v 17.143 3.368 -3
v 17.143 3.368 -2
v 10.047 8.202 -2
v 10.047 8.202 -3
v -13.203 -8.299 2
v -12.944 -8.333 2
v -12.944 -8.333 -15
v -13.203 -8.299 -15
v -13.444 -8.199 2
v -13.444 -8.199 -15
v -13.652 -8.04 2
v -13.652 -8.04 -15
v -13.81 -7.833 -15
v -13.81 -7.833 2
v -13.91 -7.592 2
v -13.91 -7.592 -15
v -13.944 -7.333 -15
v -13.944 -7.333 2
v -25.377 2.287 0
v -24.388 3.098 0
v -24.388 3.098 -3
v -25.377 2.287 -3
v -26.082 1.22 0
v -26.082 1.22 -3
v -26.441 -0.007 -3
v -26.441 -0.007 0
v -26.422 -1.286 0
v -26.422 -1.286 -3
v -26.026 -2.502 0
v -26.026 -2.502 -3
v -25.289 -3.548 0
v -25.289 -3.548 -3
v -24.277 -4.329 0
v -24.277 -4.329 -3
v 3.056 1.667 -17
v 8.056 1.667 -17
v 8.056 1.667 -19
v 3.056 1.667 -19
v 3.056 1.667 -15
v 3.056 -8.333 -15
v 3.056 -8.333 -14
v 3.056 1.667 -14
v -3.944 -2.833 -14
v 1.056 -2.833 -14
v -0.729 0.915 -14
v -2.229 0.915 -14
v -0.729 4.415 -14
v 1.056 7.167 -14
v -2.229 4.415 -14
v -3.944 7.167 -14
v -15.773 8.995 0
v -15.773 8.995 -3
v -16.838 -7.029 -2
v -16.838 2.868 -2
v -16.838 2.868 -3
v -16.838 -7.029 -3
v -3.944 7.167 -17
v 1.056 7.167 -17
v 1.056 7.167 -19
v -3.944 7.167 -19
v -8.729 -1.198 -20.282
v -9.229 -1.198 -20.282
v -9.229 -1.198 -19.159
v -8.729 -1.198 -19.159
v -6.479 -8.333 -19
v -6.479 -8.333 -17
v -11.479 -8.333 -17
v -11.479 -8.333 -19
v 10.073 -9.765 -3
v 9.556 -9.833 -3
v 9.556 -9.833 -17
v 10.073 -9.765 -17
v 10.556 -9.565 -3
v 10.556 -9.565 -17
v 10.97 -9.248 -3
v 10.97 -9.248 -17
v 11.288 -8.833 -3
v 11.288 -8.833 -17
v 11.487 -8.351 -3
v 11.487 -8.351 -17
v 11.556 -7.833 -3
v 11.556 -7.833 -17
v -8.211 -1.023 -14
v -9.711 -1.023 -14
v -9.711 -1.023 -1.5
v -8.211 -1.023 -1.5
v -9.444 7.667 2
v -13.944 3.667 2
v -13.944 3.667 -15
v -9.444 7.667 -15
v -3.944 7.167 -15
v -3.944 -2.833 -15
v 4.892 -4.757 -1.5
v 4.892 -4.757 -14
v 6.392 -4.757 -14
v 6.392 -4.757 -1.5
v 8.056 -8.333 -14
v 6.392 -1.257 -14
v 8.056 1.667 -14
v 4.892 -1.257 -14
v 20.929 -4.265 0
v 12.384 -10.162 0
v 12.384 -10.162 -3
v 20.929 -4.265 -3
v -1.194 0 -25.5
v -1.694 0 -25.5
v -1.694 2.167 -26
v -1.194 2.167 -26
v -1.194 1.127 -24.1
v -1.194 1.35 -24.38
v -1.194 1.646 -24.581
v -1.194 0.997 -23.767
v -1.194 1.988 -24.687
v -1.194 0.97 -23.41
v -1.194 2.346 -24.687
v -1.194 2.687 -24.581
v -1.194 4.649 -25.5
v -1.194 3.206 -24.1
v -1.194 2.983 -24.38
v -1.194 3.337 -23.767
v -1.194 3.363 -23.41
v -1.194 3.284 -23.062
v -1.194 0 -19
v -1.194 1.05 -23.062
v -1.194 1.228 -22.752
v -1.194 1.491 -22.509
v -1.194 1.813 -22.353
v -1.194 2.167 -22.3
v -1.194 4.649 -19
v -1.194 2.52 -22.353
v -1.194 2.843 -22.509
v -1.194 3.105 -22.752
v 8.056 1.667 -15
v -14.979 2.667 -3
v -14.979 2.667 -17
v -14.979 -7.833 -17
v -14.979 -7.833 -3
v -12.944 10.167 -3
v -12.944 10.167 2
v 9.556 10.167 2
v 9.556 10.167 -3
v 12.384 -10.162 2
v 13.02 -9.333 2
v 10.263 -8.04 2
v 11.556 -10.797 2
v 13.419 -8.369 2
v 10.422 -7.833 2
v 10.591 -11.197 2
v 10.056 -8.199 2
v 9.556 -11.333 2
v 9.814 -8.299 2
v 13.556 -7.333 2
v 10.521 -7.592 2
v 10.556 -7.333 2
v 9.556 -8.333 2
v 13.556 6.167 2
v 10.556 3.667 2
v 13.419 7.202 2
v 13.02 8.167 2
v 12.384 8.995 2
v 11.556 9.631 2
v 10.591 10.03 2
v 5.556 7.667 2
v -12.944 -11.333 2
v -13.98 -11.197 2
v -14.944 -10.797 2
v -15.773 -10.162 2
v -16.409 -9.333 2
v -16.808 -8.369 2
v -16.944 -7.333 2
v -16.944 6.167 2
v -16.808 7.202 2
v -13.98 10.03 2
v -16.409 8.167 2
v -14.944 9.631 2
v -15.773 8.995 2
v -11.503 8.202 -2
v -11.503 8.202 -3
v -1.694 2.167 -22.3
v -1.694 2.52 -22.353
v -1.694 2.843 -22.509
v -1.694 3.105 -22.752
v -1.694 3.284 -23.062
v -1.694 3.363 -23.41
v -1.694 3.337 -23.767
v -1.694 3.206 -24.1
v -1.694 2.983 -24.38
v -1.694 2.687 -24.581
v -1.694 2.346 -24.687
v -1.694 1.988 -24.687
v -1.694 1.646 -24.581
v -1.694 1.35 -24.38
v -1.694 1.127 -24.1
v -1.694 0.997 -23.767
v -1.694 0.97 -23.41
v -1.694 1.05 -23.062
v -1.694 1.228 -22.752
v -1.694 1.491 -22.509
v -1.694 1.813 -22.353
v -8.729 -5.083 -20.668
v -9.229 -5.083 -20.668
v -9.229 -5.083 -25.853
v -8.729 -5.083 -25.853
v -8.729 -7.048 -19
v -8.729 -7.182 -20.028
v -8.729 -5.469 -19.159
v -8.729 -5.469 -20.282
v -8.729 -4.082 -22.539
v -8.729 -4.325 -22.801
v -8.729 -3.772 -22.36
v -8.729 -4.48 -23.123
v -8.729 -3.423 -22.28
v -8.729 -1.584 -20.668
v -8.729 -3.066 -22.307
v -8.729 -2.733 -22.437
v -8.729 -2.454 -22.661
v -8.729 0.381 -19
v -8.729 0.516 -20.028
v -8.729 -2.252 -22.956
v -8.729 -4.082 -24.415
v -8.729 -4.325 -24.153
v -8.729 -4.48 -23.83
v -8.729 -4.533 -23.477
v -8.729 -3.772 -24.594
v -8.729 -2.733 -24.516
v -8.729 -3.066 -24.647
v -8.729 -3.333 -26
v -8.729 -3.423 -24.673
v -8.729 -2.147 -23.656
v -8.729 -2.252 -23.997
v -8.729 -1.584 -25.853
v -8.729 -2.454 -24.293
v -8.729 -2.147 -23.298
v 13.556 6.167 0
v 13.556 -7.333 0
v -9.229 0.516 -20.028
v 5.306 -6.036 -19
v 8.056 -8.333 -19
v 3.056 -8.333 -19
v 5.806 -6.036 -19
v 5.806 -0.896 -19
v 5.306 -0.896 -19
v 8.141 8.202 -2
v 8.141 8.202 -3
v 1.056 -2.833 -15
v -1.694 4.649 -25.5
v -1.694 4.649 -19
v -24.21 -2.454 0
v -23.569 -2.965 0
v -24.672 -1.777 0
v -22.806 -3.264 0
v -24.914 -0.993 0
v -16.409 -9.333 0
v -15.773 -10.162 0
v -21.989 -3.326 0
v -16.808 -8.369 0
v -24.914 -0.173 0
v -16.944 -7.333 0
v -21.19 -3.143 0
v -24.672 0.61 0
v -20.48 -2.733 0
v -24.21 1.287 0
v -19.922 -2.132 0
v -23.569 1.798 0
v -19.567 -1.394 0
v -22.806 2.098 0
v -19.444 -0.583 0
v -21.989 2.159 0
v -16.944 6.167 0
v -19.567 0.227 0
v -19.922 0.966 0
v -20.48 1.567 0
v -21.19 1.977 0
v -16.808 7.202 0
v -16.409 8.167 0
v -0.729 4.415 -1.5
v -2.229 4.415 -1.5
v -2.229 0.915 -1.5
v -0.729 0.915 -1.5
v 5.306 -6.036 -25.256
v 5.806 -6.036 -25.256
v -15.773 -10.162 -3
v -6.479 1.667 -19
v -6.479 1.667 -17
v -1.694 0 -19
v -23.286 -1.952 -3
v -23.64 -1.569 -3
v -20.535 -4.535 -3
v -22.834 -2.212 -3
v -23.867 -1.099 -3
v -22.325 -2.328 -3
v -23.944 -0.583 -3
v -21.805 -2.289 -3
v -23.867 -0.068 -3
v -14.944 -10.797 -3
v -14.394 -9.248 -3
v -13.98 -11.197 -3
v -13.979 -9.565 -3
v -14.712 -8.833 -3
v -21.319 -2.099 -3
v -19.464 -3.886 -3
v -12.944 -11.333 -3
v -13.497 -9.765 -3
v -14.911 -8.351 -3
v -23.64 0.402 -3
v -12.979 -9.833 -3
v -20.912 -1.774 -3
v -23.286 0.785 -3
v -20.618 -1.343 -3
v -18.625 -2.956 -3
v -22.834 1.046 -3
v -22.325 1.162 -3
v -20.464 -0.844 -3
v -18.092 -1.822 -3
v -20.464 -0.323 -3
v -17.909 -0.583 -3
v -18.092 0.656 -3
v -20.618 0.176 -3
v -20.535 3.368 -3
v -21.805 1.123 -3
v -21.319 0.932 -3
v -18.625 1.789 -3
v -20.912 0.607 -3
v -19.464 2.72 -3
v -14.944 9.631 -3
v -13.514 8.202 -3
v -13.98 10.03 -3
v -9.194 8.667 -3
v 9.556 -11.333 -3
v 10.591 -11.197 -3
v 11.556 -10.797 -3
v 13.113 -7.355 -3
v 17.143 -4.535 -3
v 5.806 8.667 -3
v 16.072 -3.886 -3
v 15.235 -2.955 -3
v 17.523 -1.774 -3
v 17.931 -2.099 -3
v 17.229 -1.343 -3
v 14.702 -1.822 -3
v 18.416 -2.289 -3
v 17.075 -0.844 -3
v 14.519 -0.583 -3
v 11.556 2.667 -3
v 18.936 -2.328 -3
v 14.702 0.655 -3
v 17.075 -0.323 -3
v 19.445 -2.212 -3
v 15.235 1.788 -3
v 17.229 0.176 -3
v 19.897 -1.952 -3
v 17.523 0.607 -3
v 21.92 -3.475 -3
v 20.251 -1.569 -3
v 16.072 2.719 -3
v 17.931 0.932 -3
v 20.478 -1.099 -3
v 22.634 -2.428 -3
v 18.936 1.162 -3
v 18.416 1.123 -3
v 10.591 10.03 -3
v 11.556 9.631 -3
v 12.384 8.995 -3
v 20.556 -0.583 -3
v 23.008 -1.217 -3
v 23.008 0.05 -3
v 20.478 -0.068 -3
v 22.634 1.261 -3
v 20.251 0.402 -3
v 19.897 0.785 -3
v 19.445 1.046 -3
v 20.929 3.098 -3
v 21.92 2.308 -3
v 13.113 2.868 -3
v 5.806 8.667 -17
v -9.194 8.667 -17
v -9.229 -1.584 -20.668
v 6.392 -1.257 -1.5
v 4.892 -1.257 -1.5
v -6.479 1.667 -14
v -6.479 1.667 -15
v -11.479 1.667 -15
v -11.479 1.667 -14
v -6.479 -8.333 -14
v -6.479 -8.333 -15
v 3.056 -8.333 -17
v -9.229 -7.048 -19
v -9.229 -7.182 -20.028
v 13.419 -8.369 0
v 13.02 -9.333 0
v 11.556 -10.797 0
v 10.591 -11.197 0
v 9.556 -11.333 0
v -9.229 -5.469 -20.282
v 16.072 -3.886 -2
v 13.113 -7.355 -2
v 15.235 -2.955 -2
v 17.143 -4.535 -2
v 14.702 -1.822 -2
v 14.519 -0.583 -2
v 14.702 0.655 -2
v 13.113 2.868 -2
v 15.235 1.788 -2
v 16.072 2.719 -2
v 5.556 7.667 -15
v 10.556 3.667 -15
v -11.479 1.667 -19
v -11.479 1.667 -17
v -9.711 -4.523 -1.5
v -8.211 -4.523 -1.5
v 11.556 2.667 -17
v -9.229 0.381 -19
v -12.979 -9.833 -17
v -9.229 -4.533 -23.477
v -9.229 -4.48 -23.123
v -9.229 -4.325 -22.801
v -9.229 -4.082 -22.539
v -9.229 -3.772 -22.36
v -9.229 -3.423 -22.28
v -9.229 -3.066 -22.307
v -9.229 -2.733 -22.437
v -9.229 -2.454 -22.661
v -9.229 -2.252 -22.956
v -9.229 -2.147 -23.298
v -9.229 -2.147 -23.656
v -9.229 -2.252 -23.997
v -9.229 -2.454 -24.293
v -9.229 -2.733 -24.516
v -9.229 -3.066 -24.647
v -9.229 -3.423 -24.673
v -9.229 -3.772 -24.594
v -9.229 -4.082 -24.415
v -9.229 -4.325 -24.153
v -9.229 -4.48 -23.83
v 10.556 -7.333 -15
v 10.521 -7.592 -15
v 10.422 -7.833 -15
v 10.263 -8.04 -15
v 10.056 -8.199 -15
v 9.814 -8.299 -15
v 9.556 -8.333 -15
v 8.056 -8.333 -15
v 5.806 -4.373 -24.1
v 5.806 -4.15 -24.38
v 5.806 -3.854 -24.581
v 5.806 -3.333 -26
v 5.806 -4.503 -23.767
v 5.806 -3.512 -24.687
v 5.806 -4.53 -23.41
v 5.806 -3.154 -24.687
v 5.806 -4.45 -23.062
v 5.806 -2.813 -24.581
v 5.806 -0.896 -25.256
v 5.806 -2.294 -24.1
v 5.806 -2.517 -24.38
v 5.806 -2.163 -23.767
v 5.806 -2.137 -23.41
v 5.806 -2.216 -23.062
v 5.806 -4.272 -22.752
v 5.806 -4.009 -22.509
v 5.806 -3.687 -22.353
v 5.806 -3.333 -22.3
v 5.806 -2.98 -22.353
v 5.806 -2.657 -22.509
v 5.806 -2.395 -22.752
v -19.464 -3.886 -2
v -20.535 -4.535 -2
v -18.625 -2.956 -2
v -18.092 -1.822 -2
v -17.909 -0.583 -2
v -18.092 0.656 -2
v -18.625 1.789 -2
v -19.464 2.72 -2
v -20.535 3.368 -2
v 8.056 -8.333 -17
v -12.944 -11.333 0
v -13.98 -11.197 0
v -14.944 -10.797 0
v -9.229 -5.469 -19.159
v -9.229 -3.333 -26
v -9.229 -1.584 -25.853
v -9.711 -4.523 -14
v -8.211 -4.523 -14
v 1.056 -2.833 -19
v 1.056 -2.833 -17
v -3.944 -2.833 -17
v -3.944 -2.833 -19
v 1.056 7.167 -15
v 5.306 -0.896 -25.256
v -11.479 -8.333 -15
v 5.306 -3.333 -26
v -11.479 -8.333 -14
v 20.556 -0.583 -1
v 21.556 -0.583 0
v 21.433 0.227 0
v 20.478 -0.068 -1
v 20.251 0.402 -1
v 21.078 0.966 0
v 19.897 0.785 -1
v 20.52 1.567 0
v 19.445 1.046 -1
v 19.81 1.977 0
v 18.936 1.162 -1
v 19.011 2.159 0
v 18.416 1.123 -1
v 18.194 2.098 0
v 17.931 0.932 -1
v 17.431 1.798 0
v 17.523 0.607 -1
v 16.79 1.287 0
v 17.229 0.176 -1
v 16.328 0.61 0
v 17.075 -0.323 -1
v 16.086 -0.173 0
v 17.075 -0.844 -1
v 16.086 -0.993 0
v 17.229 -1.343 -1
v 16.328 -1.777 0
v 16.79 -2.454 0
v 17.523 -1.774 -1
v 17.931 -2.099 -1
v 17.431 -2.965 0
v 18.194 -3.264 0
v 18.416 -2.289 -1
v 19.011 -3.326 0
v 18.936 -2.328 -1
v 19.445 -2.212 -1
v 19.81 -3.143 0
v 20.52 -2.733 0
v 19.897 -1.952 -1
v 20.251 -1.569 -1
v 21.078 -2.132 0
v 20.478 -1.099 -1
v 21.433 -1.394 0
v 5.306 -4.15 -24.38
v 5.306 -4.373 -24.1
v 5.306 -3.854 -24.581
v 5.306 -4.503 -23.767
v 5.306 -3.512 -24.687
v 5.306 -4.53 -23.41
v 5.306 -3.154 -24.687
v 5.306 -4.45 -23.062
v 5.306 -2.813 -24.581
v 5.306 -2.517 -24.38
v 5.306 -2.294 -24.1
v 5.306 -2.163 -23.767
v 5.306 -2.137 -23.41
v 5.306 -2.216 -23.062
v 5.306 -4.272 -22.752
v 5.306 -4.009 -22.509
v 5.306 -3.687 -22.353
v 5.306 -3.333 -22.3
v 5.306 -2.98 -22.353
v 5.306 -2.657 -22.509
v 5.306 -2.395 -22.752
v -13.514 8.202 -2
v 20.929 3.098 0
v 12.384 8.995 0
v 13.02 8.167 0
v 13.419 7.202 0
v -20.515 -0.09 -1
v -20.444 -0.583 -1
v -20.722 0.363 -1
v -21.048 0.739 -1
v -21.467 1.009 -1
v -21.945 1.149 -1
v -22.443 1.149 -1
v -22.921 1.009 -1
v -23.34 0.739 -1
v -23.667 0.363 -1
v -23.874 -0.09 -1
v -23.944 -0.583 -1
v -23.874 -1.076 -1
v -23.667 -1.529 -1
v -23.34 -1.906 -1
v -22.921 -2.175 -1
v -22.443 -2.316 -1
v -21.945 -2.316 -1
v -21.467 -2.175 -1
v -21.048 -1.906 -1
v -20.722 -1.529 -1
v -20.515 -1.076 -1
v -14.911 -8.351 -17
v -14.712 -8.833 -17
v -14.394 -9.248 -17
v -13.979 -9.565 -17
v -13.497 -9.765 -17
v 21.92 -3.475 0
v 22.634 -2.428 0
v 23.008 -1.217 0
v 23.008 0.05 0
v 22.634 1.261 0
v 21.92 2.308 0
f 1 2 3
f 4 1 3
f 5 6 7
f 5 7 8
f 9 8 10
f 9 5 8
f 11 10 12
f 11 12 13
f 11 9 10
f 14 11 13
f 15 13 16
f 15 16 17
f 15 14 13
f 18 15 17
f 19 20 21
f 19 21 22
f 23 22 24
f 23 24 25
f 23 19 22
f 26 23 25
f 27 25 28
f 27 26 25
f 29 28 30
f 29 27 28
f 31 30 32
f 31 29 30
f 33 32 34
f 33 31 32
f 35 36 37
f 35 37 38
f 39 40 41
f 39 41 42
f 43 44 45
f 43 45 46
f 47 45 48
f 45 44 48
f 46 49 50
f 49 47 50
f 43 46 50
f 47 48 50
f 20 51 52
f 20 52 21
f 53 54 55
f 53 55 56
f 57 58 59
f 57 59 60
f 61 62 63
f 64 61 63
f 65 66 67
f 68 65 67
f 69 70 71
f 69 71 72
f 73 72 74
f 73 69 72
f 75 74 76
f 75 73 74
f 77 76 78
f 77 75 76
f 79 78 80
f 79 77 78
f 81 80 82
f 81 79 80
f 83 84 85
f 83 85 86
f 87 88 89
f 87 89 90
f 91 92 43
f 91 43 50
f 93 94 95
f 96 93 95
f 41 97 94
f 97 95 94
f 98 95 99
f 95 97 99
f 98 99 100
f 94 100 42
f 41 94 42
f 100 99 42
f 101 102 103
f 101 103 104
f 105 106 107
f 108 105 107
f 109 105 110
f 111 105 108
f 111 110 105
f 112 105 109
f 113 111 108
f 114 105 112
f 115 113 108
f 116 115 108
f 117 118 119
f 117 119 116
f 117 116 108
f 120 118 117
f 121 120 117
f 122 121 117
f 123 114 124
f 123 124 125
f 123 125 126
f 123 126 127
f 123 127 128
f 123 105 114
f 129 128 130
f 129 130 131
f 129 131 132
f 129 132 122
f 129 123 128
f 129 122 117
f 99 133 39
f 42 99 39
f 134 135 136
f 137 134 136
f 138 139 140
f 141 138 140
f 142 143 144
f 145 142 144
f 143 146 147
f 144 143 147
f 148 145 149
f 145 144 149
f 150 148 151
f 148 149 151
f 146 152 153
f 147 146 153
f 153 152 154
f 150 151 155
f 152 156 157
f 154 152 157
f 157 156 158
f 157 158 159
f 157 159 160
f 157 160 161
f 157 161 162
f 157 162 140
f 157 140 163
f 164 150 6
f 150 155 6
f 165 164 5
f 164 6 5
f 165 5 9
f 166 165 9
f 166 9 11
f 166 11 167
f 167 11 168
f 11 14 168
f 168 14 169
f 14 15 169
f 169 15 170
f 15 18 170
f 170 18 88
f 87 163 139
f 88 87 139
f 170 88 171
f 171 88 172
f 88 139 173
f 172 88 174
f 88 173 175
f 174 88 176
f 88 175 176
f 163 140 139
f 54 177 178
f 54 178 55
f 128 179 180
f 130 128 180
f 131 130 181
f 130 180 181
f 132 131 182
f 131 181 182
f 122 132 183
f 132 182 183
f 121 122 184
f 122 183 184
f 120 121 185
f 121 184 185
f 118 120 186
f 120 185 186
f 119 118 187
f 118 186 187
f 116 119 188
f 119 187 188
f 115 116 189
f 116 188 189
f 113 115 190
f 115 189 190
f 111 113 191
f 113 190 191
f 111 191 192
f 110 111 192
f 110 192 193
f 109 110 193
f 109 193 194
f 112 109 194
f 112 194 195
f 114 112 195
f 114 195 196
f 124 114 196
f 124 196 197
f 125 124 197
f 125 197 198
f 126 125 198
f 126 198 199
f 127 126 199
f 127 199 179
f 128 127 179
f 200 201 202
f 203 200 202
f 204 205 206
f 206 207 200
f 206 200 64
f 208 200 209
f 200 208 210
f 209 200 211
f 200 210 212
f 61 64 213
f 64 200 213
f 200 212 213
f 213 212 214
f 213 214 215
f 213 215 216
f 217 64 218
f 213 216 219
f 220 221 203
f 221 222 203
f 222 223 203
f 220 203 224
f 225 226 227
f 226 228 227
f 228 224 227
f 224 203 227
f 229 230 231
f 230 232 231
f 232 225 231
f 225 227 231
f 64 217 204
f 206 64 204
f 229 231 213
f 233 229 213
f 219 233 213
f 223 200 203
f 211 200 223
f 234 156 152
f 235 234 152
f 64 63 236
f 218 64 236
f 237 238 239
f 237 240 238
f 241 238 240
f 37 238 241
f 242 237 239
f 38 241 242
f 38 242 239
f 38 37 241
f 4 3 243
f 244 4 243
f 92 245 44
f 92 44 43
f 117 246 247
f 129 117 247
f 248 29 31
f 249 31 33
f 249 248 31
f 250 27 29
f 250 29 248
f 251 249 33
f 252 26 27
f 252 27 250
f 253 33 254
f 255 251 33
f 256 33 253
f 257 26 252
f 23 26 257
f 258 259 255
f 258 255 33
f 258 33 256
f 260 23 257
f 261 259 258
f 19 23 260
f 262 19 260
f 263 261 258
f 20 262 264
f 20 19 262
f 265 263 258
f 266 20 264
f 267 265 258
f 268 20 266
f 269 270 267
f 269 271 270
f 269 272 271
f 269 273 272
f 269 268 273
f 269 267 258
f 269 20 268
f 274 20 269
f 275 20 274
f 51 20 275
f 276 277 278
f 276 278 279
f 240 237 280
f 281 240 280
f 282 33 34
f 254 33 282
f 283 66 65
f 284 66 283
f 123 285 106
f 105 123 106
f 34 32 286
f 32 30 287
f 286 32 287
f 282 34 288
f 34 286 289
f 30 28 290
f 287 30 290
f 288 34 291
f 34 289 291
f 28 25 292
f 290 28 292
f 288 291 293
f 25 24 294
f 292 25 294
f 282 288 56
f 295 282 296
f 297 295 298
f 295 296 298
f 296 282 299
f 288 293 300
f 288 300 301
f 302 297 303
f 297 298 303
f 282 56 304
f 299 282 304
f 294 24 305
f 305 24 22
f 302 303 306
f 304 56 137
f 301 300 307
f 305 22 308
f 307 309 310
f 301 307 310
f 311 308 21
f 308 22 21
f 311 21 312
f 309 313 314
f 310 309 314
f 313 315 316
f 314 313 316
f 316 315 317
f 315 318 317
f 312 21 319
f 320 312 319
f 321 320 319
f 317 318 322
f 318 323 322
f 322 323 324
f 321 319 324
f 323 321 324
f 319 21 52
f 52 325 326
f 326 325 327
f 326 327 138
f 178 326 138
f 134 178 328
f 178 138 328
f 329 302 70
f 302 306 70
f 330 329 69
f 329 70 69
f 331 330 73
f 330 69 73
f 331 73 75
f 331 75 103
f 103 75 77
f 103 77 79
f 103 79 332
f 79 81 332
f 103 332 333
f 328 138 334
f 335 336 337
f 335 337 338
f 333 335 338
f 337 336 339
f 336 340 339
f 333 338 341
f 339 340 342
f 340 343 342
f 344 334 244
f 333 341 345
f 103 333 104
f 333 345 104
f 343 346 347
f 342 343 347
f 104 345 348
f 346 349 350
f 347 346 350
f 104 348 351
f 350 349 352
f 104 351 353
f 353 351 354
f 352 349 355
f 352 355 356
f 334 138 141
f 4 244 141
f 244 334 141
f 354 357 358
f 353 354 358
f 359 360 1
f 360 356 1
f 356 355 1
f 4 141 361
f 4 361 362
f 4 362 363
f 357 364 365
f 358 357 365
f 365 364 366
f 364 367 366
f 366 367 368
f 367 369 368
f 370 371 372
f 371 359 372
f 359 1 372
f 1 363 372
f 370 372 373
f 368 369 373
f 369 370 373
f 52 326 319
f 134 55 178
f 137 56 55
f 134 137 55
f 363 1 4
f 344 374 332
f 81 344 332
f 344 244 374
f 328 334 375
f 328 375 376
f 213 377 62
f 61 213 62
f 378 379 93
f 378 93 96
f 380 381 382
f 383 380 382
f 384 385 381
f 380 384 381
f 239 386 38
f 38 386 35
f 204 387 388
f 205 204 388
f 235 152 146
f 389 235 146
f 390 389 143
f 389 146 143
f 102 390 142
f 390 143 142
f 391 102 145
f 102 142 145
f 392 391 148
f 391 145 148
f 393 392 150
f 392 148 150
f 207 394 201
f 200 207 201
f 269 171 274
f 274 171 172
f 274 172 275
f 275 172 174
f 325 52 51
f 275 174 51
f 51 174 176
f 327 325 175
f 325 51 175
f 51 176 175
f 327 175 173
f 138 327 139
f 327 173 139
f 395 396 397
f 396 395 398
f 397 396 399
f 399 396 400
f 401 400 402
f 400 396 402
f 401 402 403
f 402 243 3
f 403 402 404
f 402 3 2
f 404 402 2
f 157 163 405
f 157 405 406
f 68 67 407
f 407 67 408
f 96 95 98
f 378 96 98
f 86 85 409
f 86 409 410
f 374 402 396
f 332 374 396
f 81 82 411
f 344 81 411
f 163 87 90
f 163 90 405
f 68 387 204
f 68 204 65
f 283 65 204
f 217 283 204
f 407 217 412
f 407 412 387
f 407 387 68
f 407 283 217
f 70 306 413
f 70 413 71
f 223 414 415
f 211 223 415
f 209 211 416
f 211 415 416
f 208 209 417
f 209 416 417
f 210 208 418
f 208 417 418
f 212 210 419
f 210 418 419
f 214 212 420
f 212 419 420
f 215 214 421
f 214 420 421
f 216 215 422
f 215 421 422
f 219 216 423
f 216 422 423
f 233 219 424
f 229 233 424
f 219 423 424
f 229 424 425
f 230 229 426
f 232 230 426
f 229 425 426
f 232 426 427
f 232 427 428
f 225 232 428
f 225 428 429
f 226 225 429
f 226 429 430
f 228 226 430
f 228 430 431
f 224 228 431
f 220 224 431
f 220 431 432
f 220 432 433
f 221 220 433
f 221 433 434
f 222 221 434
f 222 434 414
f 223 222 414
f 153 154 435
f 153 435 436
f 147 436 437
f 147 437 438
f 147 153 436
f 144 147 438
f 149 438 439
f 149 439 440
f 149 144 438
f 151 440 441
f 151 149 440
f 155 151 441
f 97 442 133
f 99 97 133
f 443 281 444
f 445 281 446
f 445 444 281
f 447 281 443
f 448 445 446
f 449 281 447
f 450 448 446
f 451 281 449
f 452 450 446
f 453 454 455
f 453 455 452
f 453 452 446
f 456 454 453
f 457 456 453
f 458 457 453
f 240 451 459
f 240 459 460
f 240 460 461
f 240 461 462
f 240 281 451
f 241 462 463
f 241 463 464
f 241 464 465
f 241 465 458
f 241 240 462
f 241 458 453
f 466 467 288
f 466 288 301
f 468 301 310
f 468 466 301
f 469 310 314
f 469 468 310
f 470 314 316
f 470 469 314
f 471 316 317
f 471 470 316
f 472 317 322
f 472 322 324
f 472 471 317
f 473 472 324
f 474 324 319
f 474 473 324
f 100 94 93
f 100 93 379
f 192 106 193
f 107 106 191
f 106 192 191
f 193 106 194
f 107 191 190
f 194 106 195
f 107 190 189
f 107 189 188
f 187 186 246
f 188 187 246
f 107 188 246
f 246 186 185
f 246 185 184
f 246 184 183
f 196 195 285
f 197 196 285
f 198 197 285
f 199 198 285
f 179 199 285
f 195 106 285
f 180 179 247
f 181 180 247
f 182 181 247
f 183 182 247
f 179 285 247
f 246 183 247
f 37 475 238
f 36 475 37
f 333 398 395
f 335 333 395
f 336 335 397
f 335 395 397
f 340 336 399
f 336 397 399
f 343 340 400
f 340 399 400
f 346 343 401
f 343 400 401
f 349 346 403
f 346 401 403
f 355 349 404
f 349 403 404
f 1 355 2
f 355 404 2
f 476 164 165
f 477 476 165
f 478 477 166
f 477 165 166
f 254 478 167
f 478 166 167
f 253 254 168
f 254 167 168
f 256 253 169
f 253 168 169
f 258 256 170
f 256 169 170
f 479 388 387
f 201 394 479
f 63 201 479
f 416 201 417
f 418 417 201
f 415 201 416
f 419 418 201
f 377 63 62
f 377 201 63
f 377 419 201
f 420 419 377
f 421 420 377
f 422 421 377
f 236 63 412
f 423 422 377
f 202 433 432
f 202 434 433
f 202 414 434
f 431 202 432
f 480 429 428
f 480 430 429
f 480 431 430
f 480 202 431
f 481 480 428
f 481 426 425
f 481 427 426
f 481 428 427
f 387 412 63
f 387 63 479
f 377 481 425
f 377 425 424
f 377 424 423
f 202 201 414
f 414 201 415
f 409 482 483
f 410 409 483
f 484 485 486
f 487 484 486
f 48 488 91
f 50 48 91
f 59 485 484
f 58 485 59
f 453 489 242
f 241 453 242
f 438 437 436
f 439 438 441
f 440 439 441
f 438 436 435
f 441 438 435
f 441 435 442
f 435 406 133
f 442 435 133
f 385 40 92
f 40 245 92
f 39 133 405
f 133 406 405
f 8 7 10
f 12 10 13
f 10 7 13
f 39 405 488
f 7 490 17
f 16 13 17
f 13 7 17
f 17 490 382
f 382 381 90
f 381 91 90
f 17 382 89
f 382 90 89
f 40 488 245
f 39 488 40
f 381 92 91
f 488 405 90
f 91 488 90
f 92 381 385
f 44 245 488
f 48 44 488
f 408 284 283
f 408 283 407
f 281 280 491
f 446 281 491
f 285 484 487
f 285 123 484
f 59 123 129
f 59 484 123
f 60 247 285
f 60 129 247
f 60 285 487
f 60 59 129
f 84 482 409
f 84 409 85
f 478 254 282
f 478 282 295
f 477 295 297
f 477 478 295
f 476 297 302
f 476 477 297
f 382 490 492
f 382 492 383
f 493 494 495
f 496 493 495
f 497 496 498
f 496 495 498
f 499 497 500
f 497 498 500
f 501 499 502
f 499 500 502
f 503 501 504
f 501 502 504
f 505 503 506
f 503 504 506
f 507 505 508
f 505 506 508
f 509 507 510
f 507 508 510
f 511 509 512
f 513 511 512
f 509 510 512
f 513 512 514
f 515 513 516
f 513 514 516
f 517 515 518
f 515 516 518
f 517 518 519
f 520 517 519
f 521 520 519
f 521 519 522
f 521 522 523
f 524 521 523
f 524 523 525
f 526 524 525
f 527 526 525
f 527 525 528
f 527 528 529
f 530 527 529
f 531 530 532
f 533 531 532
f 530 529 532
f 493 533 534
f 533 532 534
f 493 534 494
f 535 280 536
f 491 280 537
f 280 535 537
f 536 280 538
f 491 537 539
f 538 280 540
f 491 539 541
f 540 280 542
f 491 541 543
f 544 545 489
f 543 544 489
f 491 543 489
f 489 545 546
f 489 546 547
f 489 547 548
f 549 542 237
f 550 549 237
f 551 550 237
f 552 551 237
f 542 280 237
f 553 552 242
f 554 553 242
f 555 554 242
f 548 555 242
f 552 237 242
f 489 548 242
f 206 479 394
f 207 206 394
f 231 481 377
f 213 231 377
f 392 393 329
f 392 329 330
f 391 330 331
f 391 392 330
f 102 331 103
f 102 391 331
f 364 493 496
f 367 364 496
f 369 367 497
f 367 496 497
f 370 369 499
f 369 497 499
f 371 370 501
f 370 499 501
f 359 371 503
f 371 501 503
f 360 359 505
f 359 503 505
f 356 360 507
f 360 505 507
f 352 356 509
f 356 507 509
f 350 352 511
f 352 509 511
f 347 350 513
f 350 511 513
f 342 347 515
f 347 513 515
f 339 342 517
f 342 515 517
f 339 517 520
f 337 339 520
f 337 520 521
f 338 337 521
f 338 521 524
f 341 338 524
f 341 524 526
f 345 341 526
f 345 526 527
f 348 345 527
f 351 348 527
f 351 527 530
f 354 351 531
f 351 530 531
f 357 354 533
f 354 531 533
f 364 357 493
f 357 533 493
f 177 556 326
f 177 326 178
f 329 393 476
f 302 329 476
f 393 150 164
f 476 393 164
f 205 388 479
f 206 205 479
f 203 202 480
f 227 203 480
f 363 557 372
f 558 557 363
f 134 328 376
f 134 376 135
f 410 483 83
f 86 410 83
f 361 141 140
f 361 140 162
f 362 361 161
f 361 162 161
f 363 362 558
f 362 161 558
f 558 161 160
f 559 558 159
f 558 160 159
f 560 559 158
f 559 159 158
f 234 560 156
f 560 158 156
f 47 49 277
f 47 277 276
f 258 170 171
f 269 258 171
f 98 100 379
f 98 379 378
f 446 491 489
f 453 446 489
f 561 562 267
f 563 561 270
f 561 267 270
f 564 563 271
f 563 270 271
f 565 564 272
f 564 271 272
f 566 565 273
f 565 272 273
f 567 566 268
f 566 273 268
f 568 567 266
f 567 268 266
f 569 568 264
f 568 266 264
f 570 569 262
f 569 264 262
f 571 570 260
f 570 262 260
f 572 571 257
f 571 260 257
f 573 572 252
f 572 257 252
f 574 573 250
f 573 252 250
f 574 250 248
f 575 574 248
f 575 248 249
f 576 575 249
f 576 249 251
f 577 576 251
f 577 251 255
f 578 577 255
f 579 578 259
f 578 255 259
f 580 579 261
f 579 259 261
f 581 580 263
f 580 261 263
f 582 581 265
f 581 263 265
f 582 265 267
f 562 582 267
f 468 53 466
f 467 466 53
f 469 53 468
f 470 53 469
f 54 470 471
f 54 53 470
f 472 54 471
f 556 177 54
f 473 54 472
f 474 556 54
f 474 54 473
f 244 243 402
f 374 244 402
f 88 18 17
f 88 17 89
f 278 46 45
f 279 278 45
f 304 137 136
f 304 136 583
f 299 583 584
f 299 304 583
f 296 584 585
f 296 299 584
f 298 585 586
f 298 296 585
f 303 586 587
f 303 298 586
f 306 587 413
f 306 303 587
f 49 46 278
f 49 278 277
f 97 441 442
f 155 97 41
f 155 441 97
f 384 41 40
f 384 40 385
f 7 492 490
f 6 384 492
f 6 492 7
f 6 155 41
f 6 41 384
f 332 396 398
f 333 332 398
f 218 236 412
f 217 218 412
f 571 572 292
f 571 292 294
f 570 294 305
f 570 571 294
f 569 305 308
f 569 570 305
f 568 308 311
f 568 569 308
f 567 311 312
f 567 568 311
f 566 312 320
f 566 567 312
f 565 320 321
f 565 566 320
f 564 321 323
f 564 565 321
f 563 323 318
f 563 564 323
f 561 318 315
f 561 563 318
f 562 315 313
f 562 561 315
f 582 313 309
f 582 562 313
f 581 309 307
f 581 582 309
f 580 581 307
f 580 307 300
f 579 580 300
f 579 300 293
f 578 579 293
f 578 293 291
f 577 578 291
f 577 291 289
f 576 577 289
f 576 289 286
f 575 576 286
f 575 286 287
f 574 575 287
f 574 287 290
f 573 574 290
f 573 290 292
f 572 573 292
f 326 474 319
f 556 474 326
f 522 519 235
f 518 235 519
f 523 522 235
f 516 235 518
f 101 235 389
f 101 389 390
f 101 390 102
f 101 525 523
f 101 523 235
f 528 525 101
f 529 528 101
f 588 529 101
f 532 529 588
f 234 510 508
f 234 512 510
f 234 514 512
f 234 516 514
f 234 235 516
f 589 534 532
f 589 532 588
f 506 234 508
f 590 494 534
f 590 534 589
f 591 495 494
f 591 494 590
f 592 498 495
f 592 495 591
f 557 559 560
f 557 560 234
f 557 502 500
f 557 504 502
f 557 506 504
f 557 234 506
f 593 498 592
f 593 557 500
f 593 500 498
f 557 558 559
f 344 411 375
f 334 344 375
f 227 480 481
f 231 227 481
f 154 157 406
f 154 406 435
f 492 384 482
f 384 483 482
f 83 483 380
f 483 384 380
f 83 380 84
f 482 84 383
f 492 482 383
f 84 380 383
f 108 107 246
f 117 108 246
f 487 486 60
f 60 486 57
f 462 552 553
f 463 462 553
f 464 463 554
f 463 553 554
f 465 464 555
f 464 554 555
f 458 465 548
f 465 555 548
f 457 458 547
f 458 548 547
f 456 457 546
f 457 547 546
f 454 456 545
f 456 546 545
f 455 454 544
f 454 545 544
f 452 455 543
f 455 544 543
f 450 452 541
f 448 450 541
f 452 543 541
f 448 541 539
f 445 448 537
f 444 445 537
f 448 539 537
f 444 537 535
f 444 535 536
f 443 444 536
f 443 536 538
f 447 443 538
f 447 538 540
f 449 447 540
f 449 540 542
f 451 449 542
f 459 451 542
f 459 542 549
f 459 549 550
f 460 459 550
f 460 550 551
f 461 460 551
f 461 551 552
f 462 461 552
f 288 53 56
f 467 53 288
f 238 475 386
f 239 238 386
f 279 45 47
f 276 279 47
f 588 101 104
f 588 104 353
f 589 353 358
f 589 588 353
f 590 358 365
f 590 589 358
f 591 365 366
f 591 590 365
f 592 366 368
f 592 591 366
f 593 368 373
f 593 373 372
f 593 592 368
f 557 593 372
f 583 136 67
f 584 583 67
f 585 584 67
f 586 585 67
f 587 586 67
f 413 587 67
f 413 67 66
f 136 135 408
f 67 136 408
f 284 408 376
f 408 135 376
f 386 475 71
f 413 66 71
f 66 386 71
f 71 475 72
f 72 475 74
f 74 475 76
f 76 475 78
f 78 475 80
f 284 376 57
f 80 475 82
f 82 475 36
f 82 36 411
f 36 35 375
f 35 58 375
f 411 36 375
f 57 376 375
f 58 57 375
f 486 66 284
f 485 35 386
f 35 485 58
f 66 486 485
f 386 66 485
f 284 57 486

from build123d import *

# Parameters (mm, degrees)
SKETCH_1_R          = 1.75
EXTRUDE_1_DEPTH     = 3
EXTRUDE_START       = 2
EXTRUDE_2_DEPTH     = 2
EXTRUDE_3_DEPTH     = 14
CUT_EXTRUDE_START   = -1
CUT_EXTRUDE_1_DEPTH = 1
CHAMFER_1_SIZE      = 1
CHAMFER_2_SIZE      = 1
SKETCH_6_W          = 5
SKETCH_6_H          = 10
EXTRUDE_4_DEPTH     = 2
SKETCH_7_W          = 0.5
SKETCH_7_H          = 8
EXTRUDE_5_DEPTH     = 7
SKETCH_8_R          = 1.2
CUT_EXTRUDE_2_DEPTH = 3
SKETCH_11_R         = 1.2
CUT_EXTRUDE_3_DEPTH = 3
SKETCH_12_R         = 1.2
CUT_EXTRUDE_4_DEPTH = 3
CUT_EXTRUDE_6_DEPTH = 17
SKETCH_16_W         = 5
SKETCH_16_H         = 10
EXTRUDE_7_DEPTH     = 5
SKETCH_17_W         = 1.5
SKETCH_17_H         = 3.5
EXTRUDE_8_DEPTH     = 12.5


with BuildPart() as part:
    # Эскиз1 → Бобышка-Вытянуть1 (new body)
    with BuildSketch(Plane.XY):
        with BuildLine():
            ThreePointArc((20.928890361, -4.264902198), (23.055555556, -0.583333333), (20.928890361, 3.098235531))
            Line((20.928890361, 3.098235531), (12.38398268, 8.995093791))
            ThreePointArc((12.38398268, 8.995093791), (11.086289285, 9.862184797), (9.555555556, 10.166666667))
            Line((9.555555556, 10.166666667), (-12.944444444, 10.166666667))
            ThreePointArc((-12.944444444, 10.166666667), (-14.475178174, 9.862184797), (-15.772871569, 8.995093791))
            Line((-15.772871569, 8.995093791), (-24.387947706, 3.098235531))
            ThreePointArc((-24.387947706, 3.098235531), (-26.479451538, -0.647521096), (-24.276691296, -4.328951295))
            Line((-24.276691296, -4.328951295), (-15.772871569, -10.161760458))
            ThreePointArc((-15.772871569, -10.161760458), (-14.475178174, -11.028851463), (-12.944444444, -11.333333333))
            Line((-12.944444444, -11.333333333), (9.555555556, -11.333333333))
            ThreePointArc((9.555555556, -11.333333333), (11.086289285, -11.028851463), (12.38398268, -10.161760458))
            Line((12.38398268, -10.161760458), (20.928890361, -4.264902198))
        make_face()
        with Locations((18.805555556, -0.583333333)):
            Circle(SKETCH_1_R, mode=Mode.SUBTRACT)
        with BuildLine():
            ThreePointArc((-23.944444444, -0.583333333), (-22.194444444, 1.166666667), (-20.444444444, -0.583333333))
            ThreePointArc((-20.444444444, -0.583333333), (-22.194444444, -2.333333333), (-23.944444444, -0.583333333))
        make_face(mode=Mode.SUBTRACT)
    extrude(amount=-EXTRUDE_1_DEPTH)

    # Эскиз3 → Бобышка-Вытянуть2 (add)
    with BuildSketch(Plane.XY.offset(EXTRUDE_START)):
        with BuildLine():
            Line((-12.944444444, 10.166666667), (9.555555556, 10.166666667))
            ThreePointArc((9.555555556, 10.166666667), (12.38398268, 8.995093791), (13.555555556, 6.166666667))
            Line((13.555555556, 6.166666667), (13.555555556, -7.333333333))
            ThreePointArc((13.555555556, -7.333333333), (12.38398268, -10.161760458), (9.555555556, -11.333333333))
            Line((9.555555556, -11.333333333), (-12.944444444, -11.333333333))
            ThreePointArc((-12.944444444, -11.333333333), (-15.772871569, -10.161760458), (-16.944444444, -7.333333333))
            Line((-16.944444444, -7.333333333), (-16.944444444, 6.166666667))
            ThreePointArc((-16.944444444, 6.166666667), (-15.772871569, 8.995093791), (-12.944444444, 10.166666667))
        make_face()
    extrude(amount=-EXTRUDE_2_DEPTH)

    # Эскиз4 → Бобышка-Вытянуть3 (add)
    with BuildSketch(Plane(origin=(0, 0, -3), x_dir=(-1, 0, 0), z_dir=(0, 0, -1))):
        with BuildLine():
            Line((-5.805555556, 8.666666667), (9.194444444, 8.666666667))
            Line((9.194444444, 8.666666667), (14.979451538, 2.666666667))
            Line((14.979451538, 2.666666667), (14.979451538, -7.833333333))
            ThreePointArc((14.979451538, -7.833333333), (14.393665101, -9.247546896), (12.979451538, -9.833333333))
            Line((12.979451538, -9.833333333), (-9.555555556, -9.833333333))
            ThreePointArc((-9.555555556, -9.833333333), (-10.969769118, -9.247546896), (-11.555555556, -7.833333333))
            Line((-11.555555556, -7.833333333), (-11.555555556, 2.666666667))
            Line((-11.555555556, 2.666666667), (-5.805555556, 8.666666667))
        make_face()
    extrude(amount=EXTRUDE_3_DEPTH)

    # Эскиз5 → Вырез-Вытянуть1 (cut)
    with BuildSketch(Plane(origin=(0, 0, -3), x_dir=(-1, 0, 0), z_dir=(0, 0, -1)).offset(CUT_EXTRUDE_START)):
        with BuildLine():
            Line((-17.143050828, 3.367976899), (-10.046994094, 8.202368214))
            Line((-10.046994094, 8.202368214), (-8.140923226, 8.202368214))
            Line((-8.140923226, 8.202368214), (-13.112857934, 2.867546546))
            Line((-13.112857934, 2.867546546), (-13.112857934, -7.3554747))
            Line((-13.112857934, -7.3554747), (-17.143050828, -4.534643565))
            ThreePointArc((-17.143050828, -4.534643565), (-14.518741526, -0.583333333), (-17.143050828, 3.367976899))
        make_face()
        with BuildLine():
            Line((20.535362375, 3.367976899), (13.514232587, 8.202368214))
            Line((13.514232587, 8.202368214), (11.503497241, 8.202368214))
            Line((11.503497241, 8.202368214), (16.838318908, 2.867546546))
            Line((16.838318908, 2.867546546), (16.838318908, -7.028531022))
            Line((16.838318908, -7.028531022), (20.535362375, -4.534643565))
            ThreePointArc((20.535362375, -4.534643565), (17.908956624, -0.583333333), (20.535362375, 3.367976899))
        make_face()
    extrude(amount=CUT_EXTRUDE_1_DEPTH, mode=Mode.SUBTRACT)

    # Фаска1
    chamfer_1_edges = [part.edges().sort_by_distance(p)[0] for p in [
        (17.055555556, -0.583333333, 0),
    ]]
    chamfer(chamfer_1_edges, length=CHAMFER_1_SIZE)

    # Фаска2
    chamfer_2_edges = [part.edges().sort_by_distance(p)[0] for p in [
        (-23.944444444, -0.583333333, 0),
    ]]
    chamfer(chamfer_2_edges, length=CHAMFER_2_SIZE)

    # Эскиз6 → Бобышка-Вытянуть4 (add)
    with BuildSketch(Plane(origin=(0, 0, -17), x_dir=(-1, 0, 0), z_dir=(0, 0, -1))):
        with Locations((-5.555555556, -3.333333333)):
            Rectangle(SKETCH_6_W, SKETCH_6_H)
        with Locations((1.444444444, 2.166666667)):
            Rectangle(SKETCH_6_W, SKETCH_6_H)
        with Locations((8.979451538, -3.333333333)):
            Rectangle(SKETCH_6_W, SKETCH_6_H)
    extrude(amount=EXTRUDE_4_DEPTH)

    # Эскиз7 → Бобышка-Вытянуть5 (add, symmetric)
    with BuildSketch(Plane(origin=(0, 0, -19), x_dir=(-1, 0, 0), z_dir=(0, 0, -1))):
        with Locations((-5.555555556, -3.333333333)):
            Rectangle(SKETCH_7_W, SKETCH_7_H)
        with Locations((1.444444444, 2.166666667)):
            Rectangle(SKETCH_7_W, SKETCH_7_H)
        with Locations((8.979451538, -3.333333333)):
            Rectangle(SKETCH_7_W, SKETCH_7_H)
    extrude(amount=EXTRUDE_5_DEPTH, both=True)

    # Эскиз8 → Вырез-Вытянуть2 (cut)
    with BuildSketch(Plane.ZY.offset(9.229451538)):
        Polygon((-25.852859053, -5.08301967), (-26, -3.333333333), (-26, -7.333333333), (-19, -7.333333333), (-19, -7.048011738), (-20.028349255, -7.182352132), (-19.159176422, -5.468865668), (-20.281780656, -5.468865668), (-20.667626654, -5.08301967), align=None)
        Polygon((-26, 0.666666667), (-26, -3.333333333), (-25.852859053, -1.583646996), (-20.667626654, -1.583646996), (-20.281780656, -1.197800999), (-19.159176422, -1.197800999), (-20.028349255, 0.515685465), (-19, 0.381345072), (-19, 0.666666667), align=None)
        with Locations((-23.476723057, -3.333333333)):
            Circle(SKETCH_8_R)
    extrude(amount=-CUT_EXTRUDE_2_DEPTH, mode=Mode.SUBTRACT)

    # Эскиз11 → Вырез-Вытянуть3 (cut)
    with BuildSketch(Plane.ZY.offset(1.694444444)):
        with Locations((-23.5, 2.166666667)):
            Circle(SKETCH_11_R)
        Polygon((-19, -1.833333333), (-19, 0), (-25.500216553, 0), (-26, 2.166666667), (-26, -1.833333333), align=None)
        Polygon((-25.500216553, 4.64880104), (-19, 4.64880104), (-19, 6.166666667), (-26, 6.166666667), (-26, 2.166666667), align=None)
    extrude(amount=-CUT_EXTRUDE_3_DEPTH, mode=Mode.SUBTRACT)

    # Эскиз12 → Вырез-Вытянуть4 (cut)
    with BuildSketch(Plane.ZY.offset(-5.305555556)):
        with Locations((-23.5, -3.333333333)):
            Circle(SKETCH_12_R)
        Polygon((-19, -7.333333333), (-19, -6.035631996), (-25.256261819, -6.035631996), (-26, -3.333333333), (-26, -7.333333333), align=None)
        Polygon((-25.256261819, -0.896417806), (-19, -0.896417806), (-19, 0.666666667), (-26, 0.666666667), (-26, -3.333333333), align=None)
    extrude(amount=-CUT_EXTRUDE_4_DEPTH, mode=Mode.SUBTRACT)

    # Эскиз15 → Вырез-Вытянуть6 (cut)
    with BuildSketch(Plane.XY.offset(2)):
        with BuildLine():
            Line((-9.444444444, 7.666666667), (5.555555556, 7.666666667))
            Line((5.555555556, 7.666666667), (10.555555556, 3.666666667))
            Line((10.555555556, 3.666666667), (10.555555556, -7.333333333))
            ThreePointArc((10.555555556, -7.333333333), (10.262662337, -8.040440115), (9.555555556, -8.333333333))
            Line((9.555555556, -8.333333333), (-12.944444444, -8.333333333))
            ThreePointArc((-12.944444444, -8.333333333), (-13.651551226, -8.040440115), (-13.944444444, -7.333333333))
            Line((-13.944444444, -7.333333333), (-13.944444444, 3.666666667))
            Line((-13.944444444, 3.666666667), (-9.444444444, 7.666666667))
        make_face()
    extrude(amount=-CUT_EXTRUDE_6_DEPTH, mode=Mode.SUBTRACT)

    # Эскиз16 → Бобышка-Вытянуть7 (add)
    with BuildSketch(Plane(origin=(0, 0, -19), x_dir=(-1, 0, 0), z_dir=(0, 0, -1))):
        with Locations((8.979451538, -3.333333333)):
            Rectangle(SKETCH_16_W, SKETCH_16_H)
        with Locations((1.444444444, 2.166666667)):
            Rectangle(SKETCH_16_W, SKETCH_16_H)
        with Locations((-5.555555556, -3.333333333)):
            Rectangle(SKETCH_16_W, SKETCH_16_H)
    extrude(amount=-EXTRUDE_7_DEPTH)

    # Эскиз17 → Бобышка-Вытянуть8 (add)
    with BuildSketch(Plane.XY.offset(-14)):
        with Locations((-8.961393916, -2.773412546)):
            Rectangle(SKETCH_17_W, SKETCH_17_H)
        with Locations((-1.478668657, 2.665013022)):
            Rectangle(SKETCH_17_W, SKETCH_17_H)
        with Locations((5.641966267, -3.00690977)):
            Rectangle(SKETCH_17_W, SKETCH_17_H)
    extrude(amount=EXTRUDE_8_DEPTH)


solid = part.part
